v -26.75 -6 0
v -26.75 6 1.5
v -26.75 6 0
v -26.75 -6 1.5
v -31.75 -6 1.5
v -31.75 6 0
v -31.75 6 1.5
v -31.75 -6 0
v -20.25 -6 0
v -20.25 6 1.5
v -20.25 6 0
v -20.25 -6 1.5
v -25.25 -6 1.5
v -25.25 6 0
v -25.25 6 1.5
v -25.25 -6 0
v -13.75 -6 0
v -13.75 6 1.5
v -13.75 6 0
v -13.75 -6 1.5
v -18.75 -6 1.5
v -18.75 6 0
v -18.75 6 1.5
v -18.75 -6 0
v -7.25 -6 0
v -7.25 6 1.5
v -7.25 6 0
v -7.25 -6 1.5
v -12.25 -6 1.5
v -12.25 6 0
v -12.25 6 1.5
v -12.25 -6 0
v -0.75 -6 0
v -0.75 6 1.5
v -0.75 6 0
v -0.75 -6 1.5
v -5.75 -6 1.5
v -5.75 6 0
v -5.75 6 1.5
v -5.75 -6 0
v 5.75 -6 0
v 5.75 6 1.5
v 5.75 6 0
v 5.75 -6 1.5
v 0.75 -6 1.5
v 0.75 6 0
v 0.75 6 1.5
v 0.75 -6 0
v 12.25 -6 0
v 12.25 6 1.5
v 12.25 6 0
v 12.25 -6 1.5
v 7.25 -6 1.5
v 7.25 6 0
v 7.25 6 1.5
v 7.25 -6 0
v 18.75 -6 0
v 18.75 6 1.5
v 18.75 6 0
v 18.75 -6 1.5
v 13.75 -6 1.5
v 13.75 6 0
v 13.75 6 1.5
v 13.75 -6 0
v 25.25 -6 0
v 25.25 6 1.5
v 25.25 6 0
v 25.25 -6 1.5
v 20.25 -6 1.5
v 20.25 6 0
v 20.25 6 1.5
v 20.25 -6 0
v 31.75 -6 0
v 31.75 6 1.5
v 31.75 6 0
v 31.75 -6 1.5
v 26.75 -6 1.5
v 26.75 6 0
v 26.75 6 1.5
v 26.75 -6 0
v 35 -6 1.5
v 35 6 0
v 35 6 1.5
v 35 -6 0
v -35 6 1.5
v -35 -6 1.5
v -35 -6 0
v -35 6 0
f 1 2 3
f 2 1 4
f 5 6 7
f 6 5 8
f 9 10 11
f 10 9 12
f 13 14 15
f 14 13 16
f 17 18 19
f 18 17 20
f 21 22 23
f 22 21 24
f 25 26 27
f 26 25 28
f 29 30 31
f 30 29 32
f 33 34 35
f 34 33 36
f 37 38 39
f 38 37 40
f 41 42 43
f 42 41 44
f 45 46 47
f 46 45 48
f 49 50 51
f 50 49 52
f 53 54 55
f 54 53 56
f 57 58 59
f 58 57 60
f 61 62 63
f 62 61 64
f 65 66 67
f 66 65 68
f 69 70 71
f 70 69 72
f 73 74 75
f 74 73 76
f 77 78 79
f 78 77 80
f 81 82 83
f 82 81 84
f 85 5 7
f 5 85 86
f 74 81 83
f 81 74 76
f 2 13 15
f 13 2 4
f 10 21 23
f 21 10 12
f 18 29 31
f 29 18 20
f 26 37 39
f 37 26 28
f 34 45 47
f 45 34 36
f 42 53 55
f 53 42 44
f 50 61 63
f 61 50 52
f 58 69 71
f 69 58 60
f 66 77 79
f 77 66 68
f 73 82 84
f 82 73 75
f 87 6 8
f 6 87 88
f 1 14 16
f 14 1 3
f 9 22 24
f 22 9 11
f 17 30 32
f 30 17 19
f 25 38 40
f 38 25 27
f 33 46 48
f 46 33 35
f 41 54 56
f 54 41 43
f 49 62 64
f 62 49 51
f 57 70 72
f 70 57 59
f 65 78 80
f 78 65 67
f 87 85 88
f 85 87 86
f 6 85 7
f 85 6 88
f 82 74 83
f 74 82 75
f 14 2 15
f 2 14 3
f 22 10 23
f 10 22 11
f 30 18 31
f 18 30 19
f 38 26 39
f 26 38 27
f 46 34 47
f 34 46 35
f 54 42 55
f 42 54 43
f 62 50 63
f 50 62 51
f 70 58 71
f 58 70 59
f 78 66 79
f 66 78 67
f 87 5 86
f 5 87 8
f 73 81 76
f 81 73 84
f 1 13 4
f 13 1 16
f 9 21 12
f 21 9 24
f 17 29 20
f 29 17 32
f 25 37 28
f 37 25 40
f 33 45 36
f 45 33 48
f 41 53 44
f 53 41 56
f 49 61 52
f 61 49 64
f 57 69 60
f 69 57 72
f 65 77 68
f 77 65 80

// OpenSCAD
// 10-well comb for casting agarose gels
// Print orientation: flat on bed, teeth pointing down (-Y)

// ---------- Parameters ----------
plate_t      = 1.5;   // plate thickness (Z)
spine_len    = 70;    // spine length (X)
spine_w      = 12;    // spine width (Y)
tooth_w      = 5.0;   // tooth width (X)
tooth_len    = 12;    // tooth length (Y)
tooth_count  = 10;    // number of teeth
gap          = 1.5;   // gap between teeth (X)
eps          = 0.5;   // cutter overshoot past faces

$fn = 64;

// ---------- Derived ----------
pitch   = tooth_w + gap;            // centre-to-centre spacing of teeth
x_start = -(tooth_count - 1) * pitch / 2;  // first tooth centre (row centred on spine)

// ---------- Model ----------
difference() {
    // Base plate
    translate([-spine_len / 2, -spine_w / 2, 0])
        cube([spine_len, spine_w, plate_t]);

    // Teeth cut out from the plate
    for (i = [0 : tooth_count - 1])
        translate([x_start + i * pitch - tooth_w / 2,
                   -tooth_len / 2 - eps,
                   -eps])
            cube([tooth_w, tooth_len + 2 * eps, plate_t + 2 * eps]);
}
